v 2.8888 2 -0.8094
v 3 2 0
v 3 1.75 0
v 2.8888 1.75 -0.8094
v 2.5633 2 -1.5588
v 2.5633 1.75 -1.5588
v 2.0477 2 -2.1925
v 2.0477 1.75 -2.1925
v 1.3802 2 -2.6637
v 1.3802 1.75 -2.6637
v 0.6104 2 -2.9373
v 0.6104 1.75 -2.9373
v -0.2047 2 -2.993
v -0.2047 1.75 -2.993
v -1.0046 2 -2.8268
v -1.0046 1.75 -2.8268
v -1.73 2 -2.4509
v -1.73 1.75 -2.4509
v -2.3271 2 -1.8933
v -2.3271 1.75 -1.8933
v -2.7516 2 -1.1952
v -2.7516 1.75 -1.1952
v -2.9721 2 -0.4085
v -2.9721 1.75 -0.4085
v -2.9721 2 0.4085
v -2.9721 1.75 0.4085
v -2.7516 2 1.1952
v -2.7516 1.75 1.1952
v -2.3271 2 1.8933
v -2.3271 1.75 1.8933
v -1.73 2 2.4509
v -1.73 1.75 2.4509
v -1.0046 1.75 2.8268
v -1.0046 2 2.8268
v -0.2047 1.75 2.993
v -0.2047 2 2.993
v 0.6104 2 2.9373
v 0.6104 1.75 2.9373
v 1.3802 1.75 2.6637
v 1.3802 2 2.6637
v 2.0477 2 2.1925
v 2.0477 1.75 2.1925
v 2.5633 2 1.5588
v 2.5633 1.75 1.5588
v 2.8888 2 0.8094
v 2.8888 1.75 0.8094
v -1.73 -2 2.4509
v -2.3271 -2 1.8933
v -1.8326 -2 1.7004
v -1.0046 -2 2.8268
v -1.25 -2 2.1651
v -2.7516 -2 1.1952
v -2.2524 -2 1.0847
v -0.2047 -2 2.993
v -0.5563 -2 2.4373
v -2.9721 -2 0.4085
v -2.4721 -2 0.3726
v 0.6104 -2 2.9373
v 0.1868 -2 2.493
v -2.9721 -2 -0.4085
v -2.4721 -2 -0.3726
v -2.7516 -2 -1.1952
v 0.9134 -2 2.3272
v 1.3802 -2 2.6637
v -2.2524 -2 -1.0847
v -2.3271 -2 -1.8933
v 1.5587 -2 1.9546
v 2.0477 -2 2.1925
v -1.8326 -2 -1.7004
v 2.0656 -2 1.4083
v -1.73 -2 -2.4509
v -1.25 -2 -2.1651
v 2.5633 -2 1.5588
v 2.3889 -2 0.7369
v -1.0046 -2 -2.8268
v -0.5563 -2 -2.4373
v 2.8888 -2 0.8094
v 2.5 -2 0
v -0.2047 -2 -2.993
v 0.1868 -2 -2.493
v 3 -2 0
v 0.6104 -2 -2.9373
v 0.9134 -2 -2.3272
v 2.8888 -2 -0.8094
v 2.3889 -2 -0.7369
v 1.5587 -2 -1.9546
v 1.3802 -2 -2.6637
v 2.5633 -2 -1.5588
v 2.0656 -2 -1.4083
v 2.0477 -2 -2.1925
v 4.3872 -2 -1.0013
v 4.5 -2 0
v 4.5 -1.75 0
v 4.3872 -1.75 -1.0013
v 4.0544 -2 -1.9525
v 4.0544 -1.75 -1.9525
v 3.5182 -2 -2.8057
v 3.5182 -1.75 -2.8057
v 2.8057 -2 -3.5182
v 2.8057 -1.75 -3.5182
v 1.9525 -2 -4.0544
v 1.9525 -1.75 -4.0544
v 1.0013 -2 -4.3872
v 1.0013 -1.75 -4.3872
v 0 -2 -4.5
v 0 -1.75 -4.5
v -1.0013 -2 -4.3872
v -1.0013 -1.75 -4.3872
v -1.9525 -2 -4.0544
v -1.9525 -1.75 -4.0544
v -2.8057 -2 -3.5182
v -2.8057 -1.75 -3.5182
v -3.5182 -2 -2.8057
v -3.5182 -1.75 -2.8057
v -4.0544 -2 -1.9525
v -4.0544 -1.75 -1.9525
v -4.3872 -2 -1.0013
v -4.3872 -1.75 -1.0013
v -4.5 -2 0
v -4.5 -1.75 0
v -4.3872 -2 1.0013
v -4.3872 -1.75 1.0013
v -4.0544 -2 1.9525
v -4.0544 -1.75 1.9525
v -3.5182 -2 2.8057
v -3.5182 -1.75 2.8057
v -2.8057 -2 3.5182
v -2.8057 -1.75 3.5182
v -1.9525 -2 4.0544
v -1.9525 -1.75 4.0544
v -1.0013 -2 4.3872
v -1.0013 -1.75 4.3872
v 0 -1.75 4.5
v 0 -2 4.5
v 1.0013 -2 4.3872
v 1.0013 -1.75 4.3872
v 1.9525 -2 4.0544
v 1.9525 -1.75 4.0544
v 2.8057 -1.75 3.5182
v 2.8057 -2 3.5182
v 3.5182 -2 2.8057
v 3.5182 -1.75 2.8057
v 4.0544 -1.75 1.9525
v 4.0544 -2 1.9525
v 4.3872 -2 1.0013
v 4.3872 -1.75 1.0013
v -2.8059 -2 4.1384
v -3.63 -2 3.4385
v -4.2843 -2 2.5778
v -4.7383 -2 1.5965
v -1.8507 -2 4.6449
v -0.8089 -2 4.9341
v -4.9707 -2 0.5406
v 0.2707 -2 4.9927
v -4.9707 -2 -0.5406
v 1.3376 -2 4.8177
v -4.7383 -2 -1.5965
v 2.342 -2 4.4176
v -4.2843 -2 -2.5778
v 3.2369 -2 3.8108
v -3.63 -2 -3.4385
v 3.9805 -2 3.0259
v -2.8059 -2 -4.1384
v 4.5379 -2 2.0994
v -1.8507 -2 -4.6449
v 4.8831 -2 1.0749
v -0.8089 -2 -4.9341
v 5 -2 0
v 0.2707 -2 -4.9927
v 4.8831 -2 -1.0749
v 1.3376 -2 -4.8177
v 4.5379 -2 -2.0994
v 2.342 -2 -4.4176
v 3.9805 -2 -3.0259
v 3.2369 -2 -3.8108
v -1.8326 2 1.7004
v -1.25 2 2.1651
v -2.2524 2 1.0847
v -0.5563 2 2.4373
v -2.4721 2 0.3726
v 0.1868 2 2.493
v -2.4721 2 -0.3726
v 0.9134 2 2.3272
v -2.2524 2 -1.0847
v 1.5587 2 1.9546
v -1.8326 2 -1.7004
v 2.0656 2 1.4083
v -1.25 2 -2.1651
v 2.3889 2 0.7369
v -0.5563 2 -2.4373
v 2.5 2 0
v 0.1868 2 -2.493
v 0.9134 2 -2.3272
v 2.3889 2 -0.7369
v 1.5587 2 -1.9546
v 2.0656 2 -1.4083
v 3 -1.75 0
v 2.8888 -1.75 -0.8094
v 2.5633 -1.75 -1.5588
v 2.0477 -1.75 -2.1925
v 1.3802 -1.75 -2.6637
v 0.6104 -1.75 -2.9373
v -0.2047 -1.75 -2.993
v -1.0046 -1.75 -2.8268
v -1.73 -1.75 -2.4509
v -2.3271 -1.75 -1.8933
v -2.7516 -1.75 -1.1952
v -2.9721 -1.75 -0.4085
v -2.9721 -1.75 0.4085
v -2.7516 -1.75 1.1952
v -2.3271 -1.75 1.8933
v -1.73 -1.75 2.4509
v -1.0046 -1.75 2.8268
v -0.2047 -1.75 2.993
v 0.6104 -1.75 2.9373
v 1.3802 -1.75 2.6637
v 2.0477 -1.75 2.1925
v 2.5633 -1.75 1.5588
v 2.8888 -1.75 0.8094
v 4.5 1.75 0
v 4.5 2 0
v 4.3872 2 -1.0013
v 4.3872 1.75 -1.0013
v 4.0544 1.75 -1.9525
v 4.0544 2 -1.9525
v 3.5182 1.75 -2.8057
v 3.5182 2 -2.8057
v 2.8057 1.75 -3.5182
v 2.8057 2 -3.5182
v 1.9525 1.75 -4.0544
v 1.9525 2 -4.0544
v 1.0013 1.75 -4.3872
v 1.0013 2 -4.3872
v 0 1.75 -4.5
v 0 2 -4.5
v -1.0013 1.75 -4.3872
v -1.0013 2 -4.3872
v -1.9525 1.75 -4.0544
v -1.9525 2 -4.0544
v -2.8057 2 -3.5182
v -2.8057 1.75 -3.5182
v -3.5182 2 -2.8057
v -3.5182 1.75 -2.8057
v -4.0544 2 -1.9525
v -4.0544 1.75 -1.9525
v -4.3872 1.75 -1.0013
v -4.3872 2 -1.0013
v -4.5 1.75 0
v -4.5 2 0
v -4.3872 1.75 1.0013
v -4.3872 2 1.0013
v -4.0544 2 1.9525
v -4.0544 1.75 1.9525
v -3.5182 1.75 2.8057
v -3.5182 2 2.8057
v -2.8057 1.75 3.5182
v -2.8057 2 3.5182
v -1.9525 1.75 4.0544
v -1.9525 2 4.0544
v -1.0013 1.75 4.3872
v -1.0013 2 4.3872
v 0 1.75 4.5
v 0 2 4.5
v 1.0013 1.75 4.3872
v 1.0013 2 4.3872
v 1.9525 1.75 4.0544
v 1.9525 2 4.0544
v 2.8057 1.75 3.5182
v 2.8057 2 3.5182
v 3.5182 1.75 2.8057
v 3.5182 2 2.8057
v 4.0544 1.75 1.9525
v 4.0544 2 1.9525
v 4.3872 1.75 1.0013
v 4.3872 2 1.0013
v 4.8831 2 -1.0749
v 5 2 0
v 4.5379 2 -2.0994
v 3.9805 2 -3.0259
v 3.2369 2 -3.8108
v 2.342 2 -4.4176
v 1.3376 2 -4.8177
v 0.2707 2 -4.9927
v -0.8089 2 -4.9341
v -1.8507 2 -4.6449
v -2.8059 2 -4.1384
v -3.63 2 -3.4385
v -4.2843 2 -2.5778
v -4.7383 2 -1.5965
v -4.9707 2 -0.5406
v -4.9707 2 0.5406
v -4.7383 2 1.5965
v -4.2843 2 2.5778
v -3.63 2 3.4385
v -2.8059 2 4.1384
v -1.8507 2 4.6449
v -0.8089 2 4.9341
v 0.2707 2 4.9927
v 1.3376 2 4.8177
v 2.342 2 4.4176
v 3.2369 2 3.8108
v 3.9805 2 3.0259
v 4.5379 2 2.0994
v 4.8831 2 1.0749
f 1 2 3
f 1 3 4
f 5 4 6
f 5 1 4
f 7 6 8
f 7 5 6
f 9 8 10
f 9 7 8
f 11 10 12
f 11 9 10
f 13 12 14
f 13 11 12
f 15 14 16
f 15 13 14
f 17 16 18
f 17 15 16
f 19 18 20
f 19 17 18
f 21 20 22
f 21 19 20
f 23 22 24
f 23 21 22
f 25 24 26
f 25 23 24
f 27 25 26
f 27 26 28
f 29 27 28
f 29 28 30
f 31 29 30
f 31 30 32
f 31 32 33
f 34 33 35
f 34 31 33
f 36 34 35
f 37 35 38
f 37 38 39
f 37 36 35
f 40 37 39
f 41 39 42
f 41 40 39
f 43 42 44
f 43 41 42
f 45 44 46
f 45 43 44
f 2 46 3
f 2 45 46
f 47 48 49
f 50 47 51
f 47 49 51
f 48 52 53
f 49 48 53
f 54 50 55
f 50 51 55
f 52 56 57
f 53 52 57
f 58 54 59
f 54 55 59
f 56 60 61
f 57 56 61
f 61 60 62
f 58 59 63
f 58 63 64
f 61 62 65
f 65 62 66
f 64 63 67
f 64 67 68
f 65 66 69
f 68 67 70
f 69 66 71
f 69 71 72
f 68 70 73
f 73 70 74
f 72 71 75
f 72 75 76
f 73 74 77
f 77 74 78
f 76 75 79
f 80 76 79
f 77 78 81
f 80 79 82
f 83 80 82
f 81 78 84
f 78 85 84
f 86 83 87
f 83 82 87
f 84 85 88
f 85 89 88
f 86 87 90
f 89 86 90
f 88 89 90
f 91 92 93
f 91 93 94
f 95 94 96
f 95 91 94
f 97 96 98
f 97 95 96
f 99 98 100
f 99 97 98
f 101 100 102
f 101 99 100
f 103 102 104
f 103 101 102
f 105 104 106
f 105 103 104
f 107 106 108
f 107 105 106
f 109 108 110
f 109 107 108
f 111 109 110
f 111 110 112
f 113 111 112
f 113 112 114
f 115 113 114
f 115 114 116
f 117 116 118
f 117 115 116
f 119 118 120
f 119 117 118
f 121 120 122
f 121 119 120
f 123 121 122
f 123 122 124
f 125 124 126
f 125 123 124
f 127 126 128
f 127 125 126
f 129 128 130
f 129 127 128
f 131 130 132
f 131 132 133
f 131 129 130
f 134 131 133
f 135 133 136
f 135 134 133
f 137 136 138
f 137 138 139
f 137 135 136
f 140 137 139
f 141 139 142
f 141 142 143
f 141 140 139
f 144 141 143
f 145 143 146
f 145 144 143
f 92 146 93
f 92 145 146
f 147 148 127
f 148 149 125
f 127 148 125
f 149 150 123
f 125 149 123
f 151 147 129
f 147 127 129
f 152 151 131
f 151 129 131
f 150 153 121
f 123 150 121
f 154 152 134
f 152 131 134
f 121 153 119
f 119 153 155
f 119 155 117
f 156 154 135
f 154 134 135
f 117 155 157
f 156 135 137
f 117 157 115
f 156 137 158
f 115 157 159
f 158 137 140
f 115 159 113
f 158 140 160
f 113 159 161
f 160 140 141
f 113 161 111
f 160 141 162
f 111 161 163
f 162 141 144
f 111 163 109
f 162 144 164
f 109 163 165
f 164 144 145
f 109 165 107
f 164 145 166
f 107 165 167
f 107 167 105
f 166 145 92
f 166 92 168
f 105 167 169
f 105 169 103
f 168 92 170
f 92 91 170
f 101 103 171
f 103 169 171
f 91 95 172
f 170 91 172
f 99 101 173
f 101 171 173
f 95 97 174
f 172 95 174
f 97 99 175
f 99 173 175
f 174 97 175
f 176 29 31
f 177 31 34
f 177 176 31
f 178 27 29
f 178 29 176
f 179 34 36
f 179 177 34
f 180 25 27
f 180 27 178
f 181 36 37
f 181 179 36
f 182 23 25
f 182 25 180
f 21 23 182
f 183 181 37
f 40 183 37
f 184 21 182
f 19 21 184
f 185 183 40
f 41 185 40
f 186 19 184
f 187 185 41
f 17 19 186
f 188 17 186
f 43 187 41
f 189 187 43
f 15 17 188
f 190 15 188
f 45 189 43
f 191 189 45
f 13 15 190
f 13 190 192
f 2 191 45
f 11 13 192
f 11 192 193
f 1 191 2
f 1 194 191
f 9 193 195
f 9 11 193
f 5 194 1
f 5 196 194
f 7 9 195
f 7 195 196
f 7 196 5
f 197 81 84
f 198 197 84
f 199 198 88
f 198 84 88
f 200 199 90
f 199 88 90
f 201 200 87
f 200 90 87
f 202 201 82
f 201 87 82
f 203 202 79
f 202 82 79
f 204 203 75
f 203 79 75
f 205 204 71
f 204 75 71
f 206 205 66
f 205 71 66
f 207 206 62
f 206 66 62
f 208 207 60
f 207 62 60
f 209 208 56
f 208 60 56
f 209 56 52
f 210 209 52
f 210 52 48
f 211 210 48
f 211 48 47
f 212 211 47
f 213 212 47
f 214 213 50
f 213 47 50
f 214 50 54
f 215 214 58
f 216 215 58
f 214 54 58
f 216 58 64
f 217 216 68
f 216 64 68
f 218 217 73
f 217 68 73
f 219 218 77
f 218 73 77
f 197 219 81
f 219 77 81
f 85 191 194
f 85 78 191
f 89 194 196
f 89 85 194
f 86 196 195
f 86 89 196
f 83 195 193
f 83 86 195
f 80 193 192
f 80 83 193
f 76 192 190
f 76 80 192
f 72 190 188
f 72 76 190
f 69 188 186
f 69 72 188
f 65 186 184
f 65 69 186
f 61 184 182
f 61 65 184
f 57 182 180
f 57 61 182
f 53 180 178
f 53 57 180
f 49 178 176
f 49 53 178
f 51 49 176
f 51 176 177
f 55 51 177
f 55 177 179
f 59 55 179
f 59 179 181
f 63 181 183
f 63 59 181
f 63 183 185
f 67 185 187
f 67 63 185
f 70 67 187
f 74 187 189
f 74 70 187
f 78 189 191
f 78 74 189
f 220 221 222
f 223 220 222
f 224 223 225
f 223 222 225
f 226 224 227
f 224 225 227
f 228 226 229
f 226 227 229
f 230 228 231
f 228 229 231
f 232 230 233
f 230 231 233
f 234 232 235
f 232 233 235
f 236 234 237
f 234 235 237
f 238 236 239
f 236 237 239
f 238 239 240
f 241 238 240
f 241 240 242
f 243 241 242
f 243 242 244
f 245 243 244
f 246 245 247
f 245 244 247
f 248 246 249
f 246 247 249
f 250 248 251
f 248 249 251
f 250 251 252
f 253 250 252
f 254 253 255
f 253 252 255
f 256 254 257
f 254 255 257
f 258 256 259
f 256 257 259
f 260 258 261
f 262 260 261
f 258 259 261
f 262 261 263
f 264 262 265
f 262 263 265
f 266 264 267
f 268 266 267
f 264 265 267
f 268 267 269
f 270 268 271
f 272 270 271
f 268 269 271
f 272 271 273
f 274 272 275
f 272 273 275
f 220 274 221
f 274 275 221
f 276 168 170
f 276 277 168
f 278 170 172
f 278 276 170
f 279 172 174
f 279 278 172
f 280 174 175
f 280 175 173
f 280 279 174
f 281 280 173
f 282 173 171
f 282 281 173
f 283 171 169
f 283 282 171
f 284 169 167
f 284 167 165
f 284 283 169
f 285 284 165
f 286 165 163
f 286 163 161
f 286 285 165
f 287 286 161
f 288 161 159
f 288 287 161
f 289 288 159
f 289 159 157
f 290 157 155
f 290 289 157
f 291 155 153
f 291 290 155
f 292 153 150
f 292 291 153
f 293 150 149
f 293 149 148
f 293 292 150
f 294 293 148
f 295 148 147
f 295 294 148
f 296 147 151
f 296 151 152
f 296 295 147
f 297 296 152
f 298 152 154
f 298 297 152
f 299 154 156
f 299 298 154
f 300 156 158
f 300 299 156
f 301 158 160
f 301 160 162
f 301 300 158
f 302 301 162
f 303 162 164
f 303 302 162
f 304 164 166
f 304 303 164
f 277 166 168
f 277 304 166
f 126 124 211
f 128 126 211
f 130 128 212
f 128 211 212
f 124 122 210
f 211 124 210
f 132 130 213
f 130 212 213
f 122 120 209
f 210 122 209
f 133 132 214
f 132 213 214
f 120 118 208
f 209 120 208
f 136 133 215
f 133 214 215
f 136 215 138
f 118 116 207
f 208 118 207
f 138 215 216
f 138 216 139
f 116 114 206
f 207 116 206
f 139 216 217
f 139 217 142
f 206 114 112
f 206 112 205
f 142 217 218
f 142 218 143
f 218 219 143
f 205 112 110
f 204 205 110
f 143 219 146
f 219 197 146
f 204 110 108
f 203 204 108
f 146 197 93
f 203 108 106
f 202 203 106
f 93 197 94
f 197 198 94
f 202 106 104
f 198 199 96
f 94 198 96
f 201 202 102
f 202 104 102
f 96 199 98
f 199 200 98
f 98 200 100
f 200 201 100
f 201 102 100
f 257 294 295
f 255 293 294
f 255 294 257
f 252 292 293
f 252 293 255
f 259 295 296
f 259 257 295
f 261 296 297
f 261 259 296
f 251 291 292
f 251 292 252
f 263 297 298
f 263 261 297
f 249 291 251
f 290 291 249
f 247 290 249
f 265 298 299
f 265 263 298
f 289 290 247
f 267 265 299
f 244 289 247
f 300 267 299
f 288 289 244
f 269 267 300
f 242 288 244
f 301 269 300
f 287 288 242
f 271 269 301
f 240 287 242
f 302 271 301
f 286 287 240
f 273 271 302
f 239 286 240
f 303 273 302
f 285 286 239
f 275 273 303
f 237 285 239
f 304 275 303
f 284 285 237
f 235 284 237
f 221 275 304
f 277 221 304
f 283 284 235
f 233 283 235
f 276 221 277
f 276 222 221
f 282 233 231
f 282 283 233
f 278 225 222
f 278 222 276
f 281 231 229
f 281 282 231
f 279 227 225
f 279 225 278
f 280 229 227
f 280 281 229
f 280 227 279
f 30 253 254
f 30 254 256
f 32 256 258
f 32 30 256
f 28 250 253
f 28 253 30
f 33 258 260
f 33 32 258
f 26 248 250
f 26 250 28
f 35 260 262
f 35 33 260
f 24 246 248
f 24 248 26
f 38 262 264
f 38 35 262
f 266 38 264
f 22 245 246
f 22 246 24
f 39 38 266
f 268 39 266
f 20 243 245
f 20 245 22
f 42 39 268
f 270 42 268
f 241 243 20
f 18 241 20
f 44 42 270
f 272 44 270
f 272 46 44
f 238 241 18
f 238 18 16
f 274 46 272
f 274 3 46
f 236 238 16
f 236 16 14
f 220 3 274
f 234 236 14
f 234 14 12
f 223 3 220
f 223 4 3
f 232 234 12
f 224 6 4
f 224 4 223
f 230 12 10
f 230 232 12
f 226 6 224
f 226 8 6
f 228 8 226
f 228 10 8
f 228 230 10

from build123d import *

# Parameters (mm, degrees)
SKETCH1_R           = 5
SKETCH1_R_2         = 2.5
BOSS_EXTRUDE1_DEPTH = 2
SKETCH2_R           = 4.5
SKETCH2_R_2         = 3
CUT_EXTRUDE1_DEPTH  = 0.25


with BuildPart() as part:
    # Sketch1 → Boss-Extrude1 (new body, symmetric)
    with BuildSketch(Plane(origin=(0, 0, 0), x_dir=(1, 0, 0), z_dir=(0, 1, 0))):
        Circle(SKETCH1_R)
        Circle(SKETCH1_R_2, mode=Mode.SUBTRACT)
    extrude(amount=BOSS_EXTRUDE1_DEPTH, both=True)

    # Sketch2 → Cut-Extrude1 (cut)
    with BuildSketch(Plane(origin=(0, 2, 0), x_dir=(1, 0, 0), z_dir=(0, 1, 0))):
        Circle(SKETCH2_R)
        Circle(SKETCH2_R_2, mode=Mode.SUBTRACT)
    cut_extrude1 = extrude(amount=-CUT_EXTRUDE1_DEPTH, mode=Mode.SUBTRACT)

    # Mirror1: Cut-Extrude1 across plane
    add(cut_extrude1.mirror(Plane.ZX), mode=Mode.SUBTRACT)


solid = part.part
